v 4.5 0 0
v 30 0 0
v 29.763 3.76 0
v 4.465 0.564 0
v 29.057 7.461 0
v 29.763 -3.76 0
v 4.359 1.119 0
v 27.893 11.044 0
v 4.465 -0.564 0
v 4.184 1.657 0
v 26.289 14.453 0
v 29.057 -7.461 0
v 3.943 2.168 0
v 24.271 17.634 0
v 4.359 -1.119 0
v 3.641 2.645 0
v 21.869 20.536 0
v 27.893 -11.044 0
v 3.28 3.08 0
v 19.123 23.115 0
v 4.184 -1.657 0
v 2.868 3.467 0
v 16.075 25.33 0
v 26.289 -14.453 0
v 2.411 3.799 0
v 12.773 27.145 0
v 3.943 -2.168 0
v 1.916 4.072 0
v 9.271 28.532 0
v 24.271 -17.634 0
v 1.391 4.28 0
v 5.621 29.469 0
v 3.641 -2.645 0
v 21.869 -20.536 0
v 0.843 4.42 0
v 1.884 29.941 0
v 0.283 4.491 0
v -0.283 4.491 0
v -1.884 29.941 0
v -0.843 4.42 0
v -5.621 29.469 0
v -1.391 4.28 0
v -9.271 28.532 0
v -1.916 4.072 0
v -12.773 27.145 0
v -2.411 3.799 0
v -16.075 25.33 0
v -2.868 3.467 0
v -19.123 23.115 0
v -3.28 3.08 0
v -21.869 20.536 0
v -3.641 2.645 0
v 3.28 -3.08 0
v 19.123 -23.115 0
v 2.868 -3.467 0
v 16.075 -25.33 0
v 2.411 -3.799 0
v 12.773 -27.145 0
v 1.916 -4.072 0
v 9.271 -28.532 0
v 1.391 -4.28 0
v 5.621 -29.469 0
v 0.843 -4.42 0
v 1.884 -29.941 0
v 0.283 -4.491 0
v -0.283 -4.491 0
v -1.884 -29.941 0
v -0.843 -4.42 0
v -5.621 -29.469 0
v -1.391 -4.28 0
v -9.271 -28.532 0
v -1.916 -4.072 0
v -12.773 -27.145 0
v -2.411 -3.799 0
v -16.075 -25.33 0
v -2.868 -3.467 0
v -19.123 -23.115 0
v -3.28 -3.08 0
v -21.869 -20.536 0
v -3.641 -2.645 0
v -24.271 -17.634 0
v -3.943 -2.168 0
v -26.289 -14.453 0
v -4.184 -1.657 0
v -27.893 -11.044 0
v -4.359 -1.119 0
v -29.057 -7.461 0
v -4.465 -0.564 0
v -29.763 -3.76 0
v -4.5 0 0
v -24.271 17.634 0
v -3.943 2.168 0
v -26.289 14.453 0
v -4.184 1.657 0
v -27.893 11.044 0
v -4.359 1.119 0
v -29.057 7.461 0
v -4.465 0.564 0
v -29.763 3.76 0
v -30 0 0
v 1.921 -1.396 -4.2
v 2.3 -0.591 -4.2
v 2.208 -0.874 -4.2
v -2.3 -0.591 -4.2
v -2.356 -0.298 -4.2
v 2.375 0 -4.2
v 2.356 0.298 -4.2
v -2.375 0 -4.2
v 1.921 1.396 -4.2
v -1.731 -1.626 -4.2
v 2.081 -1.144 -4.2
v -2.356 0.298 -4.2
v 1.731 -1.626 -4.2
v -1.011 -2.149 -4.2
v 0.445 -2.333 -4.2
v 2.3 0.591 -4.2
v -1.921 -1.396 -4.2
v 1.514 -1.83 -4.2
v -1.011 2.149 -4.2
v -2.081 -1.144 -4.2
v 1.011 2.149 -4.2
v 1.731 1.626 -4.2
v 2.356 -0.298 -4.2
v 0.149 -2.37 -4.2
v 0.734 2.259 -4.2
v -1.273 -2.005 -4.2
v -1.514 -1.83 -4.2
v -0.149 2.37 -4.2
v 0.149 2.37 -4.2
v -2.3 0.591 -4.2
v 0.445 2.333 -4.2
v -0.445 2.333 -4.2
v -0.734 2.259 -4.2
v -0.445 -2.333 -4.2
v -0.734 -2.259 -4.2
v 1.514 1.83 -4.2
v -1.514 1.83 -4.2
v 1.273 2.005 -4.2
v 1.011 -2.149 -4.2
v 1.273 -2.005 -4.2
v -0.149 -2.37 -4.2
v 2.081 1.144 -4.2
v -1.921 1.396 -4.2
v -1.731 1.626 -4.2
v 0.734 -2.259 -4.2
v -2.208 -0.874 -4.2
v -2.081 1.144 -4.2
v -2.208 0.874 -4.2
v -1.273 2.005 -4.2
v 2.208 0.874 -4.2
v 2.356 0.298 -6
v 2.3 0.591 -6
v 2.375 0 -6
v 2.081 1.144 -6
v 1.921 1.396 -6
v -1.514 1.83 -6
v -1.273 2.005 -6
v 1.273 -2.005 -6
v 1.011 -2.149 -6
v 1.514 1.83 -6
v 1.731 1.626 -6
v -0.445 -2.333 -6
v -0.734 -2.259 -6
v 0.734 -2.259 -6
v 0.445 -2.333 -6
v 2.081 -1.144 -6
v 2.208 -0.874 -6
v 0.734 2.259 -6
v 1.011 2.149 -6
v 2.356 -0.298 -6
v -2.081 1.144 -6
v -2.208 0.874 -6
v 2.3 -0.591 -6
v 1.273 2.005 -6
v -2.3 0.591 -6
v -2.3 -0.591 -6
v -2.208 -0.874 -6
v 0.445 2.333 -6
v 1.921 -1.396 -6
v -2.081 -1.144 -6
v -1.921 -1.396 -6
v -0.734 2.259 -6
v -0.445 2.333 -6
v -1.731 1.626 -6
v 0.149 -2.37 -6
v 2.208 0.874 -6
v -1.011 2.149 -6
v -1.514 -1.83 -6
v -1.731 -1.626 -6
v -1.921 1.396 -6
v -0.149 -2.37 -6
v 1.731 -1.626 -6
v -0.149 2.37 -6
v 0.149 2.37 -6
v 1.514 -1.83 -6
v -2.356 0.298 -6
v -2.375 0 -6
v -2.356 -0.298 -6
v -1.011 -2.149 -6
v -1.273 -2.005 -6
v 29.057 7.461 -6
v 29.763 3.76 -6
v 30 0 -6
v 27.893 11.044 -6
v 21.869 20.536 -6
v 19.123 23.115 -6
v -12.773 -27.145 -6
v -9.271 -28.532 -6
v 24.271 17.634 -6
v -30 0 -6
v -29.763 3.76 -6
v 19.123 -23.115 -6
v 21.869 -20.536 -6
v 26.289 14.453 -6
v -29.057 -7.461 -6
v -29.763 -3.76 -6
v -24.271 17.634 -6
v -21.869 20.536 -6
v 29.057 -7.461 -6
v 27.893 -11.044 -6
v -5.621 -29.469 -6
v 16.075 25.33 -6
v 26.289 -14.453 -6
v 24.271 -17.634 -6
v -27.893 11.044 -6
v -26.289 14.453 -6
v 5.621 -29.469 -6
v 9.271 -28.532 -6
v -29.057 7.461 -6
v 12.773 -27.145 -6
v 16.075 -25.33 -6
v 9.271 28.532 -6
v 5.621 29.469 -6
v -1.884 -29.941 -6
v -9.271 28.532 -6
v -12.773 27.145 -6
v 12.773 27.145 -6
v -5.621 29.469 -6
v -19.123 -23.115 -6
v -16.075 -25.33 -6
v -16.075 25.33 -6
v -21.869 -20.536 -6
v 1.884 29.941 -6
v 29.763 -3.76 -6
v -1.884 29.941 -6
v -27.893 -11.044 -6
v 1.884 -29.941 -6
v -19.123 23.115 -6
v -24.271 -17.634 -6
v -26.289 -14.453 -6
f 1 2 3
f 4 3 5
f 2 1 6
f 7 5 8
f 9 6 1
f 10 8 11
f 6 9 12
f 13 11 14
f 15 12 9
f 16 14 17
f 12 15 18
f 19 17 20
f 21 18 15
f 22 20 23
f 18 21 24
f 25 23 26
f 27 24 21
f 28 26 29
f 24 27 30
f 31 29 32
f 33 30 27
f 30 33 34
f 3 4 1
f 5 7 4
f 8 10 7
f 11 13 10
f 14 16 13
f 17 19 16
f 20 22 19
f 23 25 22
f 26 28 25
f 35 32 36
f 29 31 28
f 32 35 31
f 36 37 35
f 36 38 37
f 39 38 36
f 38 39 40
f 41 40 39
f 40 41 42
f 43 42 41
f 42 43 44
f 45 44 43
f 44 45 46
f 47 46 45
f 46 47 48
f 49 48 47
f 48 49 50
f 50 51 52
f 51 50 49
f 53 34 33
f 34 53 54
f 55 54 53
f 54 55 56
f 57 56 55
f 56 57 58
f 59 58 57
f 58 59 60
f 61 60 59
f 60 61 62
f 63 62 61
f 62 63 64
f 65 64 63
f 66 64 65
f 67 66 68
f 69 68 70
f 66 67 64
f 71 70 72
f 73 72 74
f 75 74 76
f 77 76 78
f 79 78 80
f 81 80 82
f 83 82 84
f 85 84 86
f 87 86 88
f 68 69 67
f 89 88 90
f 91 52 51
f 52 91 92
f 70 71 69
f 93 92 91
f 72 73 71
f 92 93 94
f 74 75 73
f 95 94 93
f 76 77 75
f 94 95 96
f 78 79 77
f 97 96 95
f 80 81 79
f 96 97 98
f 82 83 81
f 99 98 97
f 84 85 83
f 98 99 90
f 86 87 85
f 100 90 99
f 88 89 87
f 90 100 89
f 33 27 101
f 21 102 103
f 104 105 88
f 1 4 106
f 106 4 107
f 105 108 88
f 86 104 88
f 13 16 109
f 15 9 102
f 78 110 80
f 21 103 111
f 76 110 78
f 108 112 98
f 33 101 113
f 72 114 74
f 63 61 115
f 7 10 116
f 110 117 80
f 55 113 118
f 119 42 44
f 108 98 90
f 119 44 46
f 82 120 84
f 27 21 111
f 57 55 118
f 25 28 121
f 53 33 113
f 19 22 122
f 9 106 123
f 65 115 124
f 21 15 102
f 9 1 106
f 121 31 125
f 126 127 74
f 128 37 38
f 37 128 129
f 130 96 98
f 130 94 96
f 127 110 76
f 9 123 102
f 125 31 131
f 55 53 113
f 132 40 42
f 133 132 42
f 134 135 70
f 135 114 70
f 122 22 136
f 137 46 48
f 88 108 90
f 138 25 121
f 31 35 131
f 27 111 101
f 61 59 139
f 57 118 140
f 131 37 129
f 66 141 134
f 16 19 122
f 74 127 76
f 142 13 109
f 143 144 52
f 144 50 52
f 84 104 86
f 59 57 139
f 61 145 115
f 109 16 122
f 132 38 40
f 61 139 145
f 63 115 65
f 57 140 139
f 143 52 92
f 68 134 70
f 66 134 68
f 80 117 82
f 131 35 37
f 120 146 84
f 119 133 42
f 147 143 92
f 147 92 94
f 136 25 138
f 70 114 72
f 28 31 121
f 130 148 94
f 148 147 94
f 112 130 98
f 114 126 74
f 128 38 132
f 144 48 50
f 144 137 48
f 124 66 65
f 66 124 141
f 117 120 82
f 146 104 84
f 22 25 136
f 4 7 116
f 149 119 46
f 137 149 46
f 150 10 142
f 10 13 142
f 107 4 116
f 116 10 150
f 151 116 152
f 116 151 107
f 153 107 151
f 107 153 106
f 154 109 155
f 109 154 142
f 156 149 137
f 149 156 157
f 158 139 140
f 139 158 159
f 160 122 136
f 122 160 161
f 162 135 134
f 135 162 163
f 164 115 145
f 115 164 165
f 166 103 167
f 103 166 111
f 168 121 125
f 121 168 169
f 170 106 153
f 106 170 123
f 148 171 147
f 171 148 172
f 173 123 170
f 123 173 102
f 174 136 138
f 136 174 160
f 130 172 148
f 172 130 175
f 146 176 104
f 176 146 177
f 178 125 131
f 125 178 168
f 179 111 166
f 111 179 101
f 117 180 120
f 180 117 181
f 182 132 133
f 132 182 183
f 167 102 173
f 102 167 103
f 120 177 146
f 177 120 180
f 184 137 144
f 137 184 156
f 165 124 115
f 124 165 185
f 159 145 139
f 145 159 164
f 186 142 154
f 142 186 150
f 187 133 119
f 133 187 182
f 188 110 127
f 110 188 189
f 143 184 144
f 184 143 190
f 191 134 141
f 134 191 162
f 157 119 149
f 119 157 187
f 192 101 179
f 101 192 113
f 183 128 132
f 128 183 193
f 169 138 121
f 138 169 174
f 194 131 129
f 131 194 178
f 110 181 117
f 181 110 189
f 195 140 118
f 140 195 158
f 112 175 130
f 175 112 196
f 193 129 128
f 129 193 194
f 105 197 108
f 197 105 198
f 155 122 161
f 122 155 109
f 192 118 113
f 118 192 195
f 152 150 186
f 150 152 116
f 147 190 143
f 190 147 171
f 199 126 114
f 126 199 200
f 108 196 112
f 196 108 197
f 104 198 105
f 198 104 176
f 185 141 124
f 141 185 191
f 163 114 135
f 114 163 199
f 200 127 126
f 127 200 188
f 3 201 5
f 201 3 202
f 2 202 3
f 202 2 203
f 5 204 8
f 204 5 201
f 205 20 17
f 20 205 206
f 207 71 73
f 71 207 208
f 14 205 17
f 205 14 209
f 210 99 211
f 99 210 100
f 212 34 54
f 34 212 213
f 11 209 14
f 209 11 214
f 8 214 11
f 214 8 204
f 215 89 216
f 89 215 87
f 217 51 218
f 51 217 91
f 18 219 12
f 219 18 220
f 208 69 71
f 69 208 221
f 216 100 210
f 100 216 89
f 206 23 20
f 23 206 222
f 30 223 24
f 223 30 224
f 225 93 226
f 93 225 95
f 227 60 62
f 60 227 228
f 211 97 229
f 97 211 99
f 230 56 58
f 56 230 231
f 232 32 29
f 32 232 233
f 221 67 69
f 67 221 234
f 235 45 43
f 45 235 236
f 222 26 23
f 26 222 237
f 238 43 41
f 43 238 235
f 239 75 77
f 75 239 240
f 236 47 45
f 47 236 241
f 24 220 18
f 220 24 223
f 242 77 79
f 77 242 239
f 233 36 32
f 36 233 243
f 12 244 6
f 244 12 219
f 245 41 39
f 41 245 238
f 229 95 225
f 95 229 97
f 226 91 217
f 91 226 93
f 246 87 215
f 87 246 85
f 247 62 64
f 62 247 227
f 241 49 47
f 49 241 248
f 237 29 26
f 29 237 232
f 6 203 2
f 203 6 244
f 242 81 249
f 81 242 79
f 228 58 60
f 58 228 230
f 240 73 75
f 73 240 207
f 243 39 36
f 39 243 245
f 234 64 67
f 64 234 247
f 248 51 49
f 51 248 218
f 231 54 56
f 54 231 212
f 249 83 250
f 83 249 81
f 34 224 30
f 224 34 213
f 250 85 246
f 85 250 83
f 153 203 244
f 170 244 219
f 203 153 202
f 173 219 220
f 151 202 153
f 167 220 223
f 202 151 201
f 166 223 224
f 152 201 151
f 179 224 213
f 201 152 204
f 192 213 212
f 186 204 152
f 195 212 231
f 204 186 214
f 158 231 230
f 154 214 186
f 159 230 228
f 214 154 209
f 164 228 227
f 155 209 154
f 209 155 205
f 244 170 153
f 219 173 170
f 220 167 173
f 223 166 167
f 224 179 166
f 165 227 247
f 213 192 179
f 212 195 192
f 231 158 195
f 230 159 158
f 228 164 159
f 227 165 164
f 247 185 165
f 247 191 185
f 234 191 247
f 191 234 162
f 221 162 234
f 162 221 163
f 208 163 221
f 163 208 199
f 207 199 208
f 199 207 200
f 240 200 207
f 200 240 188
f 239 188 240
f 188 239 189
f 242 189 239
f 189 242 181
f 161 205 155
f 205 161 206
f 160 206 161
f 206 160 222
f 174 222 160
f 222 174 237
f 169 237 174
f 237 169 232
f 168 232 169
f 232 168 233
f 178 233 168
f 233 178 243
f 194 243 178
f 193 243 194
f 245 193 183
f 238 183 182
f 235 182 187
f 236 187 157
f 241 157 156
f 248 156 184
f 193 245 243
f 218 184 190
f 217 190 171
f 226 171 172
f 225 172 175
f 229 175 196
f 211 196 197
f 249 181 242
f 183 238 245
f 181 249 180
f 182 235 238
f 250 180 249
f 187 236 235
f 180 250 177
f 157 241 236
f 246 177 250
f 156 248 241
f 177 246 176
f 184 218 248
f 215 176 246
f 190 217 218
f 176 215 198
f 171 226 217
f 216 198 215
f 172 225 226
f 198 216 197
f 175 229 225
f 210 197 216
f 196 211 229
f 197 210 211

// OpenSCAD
$fn = 50;

difference() {
	union() {
		translate(v = [0, 0, -6.0]) {
			cylinder(h = 6, r = 30.0);
		}
	}
	union() {
		translate(v = [0, 0, 0]) {
			rotate(a = [0, 0, 0]) {
				difference() {
					union() {
						translate(v = [0, 0, -9.0]) {
							cylinder(h = 9, r = 2.25);
						}
						translate(v = [0, 0, -4.2]) {
							cylinder(h = 4.2, r1 = 2.375, r2 = 4.5);
						}
						translate(v = [0, 0, -9.0]) {
							cylinder(h = 9, r = 2.375);
						}
						translate(v = [0, 0, -9.0]) {
							cylinder(h = 9, r = 2.25);
						}
					}
					union();
				}
			}
		}
	}
}
